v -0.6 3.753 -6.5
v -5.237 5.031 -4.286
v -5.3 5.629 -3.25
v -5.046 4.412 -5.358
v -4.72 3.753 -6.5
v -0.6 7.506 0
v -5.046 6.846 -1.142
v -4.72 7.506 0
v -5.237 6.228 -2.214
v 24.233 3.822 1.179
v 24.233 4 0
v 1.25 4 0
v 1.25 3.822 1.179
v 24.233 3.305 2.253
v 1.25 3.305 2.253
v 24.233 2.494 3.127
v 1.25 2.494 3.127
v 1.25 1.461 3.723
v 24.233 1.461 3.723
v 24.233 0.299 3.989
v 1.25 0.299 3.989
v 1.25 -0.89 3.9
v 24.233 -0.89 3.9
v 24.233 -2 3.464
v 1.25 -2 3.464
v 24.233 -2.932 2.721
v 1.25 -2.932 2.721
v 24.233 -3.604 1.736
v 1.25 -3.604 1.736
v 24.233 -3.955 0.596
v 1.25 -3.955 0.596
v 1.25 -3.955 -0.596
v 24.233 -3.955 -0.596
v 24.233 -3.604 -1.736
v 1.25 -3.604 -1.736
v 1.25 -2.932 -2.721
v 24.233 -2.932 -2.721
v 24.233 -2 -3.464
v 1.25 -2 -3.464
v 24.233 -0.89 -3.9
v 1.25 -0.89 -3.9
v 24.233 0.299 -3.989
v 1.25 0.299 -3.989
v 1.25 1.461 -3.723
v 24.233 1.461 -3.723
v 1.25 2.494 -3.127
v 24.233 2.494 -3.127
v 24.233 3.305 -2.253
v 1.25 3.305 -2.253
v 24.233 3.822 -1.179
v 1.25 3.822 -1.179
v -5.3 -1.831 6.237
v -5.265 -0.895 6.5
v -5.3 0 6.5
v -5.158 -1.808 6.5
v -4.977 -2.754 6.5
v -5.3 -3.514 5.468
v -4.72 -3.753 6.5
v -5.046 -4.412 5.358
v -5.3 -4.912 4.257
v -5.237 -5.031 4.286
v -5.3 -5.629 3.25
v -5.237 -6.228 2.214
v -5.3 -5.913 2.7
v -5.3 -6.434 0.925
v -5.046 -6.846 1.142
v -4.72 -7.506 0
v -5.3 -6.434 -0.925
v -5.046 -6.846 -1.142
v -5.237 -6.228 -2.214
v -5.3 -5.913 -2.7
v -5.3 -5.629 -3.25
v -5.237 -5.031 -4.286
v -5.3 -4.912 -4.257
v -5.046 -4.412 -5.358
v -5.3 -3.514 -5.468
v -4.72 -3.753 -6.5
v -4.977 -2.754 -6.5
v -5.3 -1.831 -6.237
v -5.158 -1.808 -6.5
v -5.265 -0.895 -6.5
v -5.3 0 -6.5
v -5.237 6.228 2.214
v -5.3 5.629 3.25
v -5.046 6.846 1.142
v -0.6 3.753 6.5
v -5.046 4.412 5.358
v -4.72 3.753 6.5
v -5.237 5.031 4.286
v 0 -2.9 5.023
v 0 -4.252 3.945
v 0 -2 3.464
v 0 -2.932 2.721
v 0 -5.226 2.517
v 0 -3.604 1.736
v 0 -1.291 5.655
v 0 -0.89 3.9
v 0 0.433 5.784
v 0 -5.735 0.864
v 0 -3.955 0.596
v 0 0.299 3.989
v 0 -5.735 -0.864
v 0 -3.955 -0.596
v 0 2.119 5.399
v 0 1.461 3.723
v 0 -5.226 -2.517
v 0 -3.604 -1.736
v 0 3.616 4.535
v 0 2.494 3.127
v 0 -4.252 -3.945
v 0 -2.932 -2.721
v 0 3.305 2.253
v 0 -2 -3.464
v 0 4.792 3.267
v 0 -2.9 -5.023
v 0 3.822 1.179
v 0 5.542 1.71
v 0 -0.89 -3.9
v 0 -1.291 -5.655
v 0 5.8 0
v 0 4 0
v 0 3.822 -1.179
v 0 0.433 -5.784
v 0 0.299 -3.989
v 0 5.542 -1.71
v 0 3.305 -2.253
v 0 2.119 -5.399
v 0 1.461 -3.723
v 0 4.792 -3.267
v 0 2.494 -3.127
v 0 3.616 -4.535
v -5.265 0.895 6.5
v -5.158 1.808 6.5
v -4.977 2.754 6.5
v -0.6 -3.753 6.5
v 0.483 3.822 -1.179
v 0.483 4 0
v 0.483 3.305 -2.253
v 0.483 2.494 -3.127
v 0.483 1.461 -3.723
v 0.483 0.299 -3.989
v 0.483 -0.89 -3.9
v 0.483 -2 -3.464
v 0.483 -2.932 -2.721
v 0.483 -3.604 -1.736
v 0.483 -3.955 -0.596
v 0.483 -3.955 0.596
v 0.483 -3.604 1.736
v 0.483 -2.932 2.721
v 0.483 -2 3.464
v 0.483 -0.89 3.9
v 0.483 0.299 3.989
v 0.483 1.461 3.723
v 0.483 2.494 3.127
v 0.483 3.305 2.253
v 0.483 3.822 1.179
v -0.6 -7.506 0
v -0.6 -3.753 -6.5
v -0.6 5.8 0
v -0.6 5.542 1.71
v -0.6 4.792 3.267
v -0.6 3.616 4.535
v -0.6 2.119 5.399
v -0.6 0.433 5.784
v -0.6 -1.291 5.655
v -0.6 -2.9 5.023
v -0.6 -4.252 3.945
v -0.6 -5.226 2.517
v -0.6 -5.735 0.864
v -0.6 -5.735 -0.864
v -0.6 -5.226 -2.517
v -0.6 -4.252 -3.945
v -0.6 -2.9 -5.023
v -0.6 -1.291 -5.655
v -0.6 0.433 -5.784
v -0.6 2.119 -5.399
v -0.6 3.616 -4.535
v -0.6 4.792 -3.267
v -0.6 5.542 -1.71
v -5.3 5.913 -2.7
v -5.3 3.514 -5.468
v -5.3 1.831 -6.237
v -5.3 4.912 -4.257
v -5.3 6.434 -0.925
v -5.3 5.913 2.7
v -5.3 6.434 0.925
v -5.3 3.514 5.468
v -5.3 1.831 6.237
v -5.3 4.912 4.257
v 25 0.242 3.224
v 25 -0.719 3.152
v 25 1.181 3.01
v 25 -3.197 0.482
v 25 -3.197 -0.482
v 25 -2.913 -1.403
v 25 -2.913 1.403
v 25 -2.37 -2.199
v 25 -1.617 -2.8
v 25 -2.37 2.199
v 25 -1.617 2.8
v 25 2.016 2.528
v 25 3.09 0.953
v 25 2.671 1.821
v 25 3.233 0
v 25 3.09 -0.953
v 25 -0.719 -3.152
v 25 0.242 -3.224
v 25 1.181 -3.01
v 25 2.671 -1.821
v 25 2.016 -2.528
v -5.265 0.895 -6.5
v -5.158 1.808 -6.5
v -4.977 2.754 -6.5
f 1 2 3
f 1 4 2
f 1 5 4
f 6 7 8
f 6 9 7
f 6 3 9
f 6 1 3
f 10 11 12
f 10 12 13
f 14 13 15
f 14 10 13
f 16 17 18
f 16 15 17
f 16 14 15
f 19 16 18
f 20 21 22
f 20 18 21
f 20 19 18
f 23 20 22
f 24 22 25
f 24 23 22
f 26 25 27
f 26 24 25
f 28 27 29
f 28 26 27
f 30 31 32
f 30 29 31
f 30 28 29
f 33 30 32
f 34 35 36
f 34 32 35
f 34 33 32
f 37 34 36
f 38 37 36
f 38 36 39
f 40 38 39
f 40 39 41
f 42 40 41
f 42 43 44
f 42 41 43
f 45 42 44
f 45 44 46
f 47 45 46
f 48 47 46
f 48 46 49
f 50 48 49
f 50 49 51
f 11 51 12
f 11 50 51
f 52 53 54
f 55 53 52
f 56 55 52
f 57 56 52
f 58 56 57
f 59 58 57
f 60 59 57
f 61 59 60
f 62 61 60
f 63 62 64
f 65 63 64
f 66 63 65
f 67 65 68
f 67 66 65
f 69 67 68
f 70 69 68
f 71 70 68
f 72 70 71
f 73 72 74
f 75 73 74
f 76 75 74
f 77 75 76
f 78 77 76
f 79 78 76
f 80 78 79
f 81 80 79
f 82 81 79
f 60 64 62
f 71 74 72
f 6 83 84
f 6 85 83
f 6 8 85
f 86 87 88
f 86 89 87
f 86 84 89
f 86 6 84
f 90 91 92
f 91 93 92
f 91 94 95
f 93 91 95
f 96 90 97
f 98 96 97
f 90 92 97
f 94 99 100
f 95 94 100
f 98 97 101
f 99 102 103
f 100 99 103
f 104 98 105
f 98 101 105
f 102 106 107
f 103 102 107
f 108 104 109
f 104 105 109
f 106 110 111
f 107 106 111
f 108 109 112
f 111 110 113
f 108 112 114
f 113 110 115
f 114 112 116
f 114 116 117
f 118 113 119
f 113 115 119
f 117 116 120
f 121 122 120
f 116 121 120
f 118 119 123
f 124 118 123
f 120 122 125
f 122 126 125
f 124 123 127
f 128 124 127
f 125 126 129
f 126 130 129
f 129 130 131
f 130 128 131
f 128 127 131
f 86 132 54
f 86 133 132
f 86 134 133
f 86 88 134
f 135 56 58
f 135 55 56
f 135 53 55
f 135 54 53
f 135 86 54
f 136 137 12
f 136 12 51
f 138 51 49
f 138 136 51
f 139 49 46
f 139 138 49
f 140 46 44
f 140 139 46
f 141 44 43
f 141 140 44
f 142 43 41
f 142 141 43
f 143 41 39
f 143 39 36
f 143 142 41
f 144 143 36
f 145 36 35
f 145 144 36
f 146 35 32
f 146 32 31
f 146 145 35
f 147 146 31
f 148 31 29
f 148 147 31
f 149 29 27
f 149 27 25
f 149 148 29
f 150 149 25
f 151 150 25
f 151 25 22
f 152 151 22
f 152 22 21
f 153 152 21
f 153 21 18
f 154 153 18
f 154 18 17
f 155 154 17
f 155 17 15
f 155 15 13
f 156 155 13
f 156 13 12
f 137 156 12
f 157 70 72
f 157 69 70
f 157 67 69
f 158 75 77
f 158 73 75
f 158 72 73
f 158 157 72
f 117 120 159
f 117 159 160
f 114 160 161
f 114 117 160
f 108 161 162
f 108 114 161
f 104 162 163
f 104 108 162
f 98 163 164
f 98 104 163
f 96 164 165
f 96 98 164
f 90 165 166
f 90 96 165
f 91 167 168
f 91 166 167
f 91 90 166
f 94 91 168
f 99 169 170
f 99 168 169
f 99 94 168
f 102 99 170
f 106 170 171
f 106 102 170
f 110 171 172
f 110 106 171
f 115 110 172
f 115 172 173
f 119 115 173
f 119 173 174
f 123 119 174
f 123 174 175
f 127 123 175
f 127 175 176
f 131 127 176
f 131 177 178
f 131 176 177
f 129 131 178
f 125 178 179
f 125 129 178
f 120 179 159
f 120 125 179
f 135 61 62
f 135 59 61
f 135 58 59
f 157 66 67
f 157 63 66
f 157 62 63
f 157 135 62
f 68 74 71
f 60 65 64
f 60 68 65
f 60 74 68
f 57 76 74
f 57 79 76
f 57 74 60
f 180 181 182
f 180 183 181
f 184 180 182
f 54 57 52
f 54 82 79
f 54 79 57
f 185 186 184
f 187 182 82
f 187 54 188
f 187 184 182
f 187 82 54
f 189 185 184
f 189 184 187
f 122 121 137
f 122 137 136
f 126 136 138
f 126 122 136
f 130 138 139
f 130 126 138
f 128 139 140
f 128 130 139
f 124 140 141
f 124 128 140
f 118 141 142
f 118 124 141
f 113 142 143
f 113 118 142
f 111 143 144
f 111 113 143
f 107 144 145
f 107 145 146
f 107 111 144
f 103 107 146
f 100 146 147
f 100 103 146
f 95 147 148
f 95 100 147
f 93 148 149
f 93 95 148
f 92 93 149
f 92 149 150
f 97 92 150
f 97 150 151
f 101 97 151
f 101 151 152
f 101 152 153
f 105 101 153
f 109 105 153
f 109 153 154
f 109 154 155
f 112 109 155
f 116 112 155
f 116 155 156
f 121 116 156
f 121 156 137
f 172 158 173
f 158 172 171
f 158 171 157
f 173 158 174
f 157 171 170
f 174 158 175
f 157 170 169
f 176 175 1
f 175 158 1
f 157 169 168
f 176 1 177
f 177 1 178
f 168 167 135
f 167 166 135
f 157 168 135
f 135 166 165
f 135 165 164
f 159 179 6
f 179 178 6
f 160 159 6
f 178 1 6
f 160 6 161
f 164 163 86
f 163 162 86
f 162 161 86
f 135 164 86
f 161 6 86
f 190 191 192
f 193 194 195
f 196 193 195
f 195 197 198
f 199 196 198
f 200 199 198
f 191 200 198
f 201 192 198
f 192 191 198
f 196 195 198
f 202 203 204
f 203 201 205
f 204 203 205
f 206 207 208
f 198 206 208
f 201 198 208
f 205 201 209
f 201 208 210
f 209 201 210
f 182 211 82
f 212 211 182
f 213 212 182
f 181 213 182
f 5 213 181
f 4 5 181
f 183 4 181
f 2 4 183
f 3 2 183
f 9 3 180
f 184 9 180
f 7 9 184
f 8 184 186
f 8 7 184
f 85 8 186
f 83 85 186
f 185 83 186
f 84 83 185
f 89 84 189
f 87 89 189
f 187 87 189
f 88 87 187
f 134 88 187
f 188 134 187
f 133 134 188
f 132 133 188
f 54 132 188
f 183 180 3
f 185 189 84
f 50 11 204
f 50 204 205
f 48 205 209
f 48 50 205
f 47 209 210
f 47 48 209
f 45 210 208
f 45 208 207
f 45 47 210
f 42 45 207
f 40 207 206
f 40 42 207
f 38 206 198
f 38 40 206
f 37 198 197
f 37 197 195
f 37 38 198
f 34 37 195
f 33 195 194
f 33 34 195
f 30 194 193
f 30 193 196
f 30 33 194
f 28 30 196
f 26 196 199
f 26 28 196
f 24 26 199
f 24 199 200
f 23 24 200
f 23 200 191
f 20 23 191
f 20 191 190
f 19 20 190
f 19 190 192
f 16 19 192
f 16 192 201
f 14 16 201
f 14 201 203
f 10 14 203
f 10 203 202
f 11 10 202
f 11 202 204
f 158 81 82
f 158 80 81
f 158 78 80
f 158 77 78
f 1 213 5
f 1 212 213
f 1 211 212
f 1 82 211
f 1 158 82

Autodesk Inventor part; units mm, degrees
ref_plane "YZ Plane" through (0, 0, 0) normal (1, 0, 0) x (0, 1, 0)
ref_plane "XZ Plane" through (0, 0, 0) normal (0, 1, 0) x (-1, 0, 0)
sketch "草图1" plane through (0, 0, 0) normal (0, 0, 1) x (1, 0, 0)
  line L0 (0, 5.8) -> (0, 4)
  line L1 (1.25, 4) -> (25, 4)
  line L2 (25, 4) -> (25, 0)
  line L3 (25, 0) -> (-0.6001, 0)
  line L4 (-5.7201, 0) -> (30.12, 0) projected
  line L5 (-0.6001, 0) -> (-0.6001, 5.8)
  line L6 (-0.6001, 5.8) -> (0, 5.8)
  line L7 (1.25, 4) -> (0.4831, 4)
  line L8 (0.4831, 4) -> (0, 4)
  line L9 (0, -1.16) -> (0, 6.96) projected
  dimension "d0" = 25
  dimension "d1" = 23.75
  dimension "d2" = 8
  dimension "d9" = 0.6001
  dimension "d10" = 11.6
  dimension "d13" = 0.7669
  dimension "d14" = 8
revolve "轴承体" add sketch "草图1" angle 360 about axis through (25, 0, 0) along (-1, 0, 0)
sketch "草图2" plane through (-0.6001, 0, 0) normal (-1, 0, 0) x (0, 0, 1)
  line L0 (0, 7.5056) -> (6.5, 3.7528)
  line L1 (6.5, 3.7528) -> (6.5, -3.7528)
  line L2 (6.5, -3.7528) -> (0, -7.5056)
  line L3 (0, -7.5056) -> (-6.5, -3.7528)
  line L4 (-6.5, -3.7528) -> (-6.5, 3.7528)
  line L5 (-6.5, 3.7528) -> (0, 7.5056)
  point P0 (0, 0)
  point P1 (0, 0)
  dimension "d11" = 13
extrude "头" add sketch "草图2" along normal blind 4.7
sketch "草图4" plane through (0, 0, 0) normal (0, 0, 1) x (1, 0, 0)
  line L0 (-5.3001, 6.5) -> (-5.3001, 7.5056)
  line L1 (-5.3001, 7.5056) -> (-4.7195, 7.5056)
  line L2 (-4.7195, 7.5056) -> (-5.3001, 6.5)
  line L3 (-6.2401, 0) -> (0.3399, 0) projected
  line L4 (-0.6001, 7.5056) -> (-5.3001, 7.5056) projected
  line L5 (-5.3001, 3.7528) -> (-5.3001, 7.5056) projected
  dimension "d5" = 30
  dimension "d19" = 13
revolve "倒角1" cut sketch "草图4" angle 360 about axis through (-10, 0, 0) along (1, 0, 0)
thread "螺纹" size "M8x1.25" designation "M8" class "6g" standard "GB Metric profile" length 23.75
chamfer "倒角2" distance 0.7668 distance2 0.7669 1 edges at (25, -4, 0) measured on face at (25, 0.998, -0.8842)
ref_plane "Work Plane1" through (1.525, 0, 0) normal (0, 0, 1) x (1, 0, 0)
equation "\"d11\" = SW"
equation "\"d3\" = KOH - SD"
equation "\"d15\" = GEL"
equation "\"d6\" = -0.5 * SPD + 0.5 * GD"
equation "\"d0\" = NLG"
equation "\"d1\" = GEL"
equation "\"d2\" = GD"
equation "\"d10\" = SD2"
equation "\"d14\" = BDM"
equation "\"d5\" = ANG1"
equation "\"d19\" = SW0"
equation "\"NLG\" = 25"
equation "\"GD\" = NND"
equation "\"BDM\" = NND"
equation "\"KOH\" = 5.3"
equation "\"GEL\" = 23.75"
equation "\"SW\" = 13"
equation "\"SW0\" = SW"
equation "\"SPD\" = NND - 1.2269 * PTC"
equation "\"SD2\" = SDH"
equation "\"SD\" = WFT"
equation "\"ANG1\" = 30deg"
equation "\"GAL\" = 0.61345 * PTC"
equation "\"GUL\" = 0.61345 * PTC"
equation "\"RR\" = 0.4"
equation "\"WFT\" = 0.6"
equation "\"GD1\" = THREADDIA - 1.2269 * PTC"
equation "\"THREADDIA\" = 8"
equation "\"SDH\" = 11.6"
equation "\"TOA\" = 30deg"
equation "\"FAWI\" = 45deg"
equation "\"PTC\" = 1.25"
equation "\"NND\" = 8"
equation "\"E0\" = 1.155 * SW"
properties part number "螺栓 GB/T 5783 M8 x 25" material "钢，软"
